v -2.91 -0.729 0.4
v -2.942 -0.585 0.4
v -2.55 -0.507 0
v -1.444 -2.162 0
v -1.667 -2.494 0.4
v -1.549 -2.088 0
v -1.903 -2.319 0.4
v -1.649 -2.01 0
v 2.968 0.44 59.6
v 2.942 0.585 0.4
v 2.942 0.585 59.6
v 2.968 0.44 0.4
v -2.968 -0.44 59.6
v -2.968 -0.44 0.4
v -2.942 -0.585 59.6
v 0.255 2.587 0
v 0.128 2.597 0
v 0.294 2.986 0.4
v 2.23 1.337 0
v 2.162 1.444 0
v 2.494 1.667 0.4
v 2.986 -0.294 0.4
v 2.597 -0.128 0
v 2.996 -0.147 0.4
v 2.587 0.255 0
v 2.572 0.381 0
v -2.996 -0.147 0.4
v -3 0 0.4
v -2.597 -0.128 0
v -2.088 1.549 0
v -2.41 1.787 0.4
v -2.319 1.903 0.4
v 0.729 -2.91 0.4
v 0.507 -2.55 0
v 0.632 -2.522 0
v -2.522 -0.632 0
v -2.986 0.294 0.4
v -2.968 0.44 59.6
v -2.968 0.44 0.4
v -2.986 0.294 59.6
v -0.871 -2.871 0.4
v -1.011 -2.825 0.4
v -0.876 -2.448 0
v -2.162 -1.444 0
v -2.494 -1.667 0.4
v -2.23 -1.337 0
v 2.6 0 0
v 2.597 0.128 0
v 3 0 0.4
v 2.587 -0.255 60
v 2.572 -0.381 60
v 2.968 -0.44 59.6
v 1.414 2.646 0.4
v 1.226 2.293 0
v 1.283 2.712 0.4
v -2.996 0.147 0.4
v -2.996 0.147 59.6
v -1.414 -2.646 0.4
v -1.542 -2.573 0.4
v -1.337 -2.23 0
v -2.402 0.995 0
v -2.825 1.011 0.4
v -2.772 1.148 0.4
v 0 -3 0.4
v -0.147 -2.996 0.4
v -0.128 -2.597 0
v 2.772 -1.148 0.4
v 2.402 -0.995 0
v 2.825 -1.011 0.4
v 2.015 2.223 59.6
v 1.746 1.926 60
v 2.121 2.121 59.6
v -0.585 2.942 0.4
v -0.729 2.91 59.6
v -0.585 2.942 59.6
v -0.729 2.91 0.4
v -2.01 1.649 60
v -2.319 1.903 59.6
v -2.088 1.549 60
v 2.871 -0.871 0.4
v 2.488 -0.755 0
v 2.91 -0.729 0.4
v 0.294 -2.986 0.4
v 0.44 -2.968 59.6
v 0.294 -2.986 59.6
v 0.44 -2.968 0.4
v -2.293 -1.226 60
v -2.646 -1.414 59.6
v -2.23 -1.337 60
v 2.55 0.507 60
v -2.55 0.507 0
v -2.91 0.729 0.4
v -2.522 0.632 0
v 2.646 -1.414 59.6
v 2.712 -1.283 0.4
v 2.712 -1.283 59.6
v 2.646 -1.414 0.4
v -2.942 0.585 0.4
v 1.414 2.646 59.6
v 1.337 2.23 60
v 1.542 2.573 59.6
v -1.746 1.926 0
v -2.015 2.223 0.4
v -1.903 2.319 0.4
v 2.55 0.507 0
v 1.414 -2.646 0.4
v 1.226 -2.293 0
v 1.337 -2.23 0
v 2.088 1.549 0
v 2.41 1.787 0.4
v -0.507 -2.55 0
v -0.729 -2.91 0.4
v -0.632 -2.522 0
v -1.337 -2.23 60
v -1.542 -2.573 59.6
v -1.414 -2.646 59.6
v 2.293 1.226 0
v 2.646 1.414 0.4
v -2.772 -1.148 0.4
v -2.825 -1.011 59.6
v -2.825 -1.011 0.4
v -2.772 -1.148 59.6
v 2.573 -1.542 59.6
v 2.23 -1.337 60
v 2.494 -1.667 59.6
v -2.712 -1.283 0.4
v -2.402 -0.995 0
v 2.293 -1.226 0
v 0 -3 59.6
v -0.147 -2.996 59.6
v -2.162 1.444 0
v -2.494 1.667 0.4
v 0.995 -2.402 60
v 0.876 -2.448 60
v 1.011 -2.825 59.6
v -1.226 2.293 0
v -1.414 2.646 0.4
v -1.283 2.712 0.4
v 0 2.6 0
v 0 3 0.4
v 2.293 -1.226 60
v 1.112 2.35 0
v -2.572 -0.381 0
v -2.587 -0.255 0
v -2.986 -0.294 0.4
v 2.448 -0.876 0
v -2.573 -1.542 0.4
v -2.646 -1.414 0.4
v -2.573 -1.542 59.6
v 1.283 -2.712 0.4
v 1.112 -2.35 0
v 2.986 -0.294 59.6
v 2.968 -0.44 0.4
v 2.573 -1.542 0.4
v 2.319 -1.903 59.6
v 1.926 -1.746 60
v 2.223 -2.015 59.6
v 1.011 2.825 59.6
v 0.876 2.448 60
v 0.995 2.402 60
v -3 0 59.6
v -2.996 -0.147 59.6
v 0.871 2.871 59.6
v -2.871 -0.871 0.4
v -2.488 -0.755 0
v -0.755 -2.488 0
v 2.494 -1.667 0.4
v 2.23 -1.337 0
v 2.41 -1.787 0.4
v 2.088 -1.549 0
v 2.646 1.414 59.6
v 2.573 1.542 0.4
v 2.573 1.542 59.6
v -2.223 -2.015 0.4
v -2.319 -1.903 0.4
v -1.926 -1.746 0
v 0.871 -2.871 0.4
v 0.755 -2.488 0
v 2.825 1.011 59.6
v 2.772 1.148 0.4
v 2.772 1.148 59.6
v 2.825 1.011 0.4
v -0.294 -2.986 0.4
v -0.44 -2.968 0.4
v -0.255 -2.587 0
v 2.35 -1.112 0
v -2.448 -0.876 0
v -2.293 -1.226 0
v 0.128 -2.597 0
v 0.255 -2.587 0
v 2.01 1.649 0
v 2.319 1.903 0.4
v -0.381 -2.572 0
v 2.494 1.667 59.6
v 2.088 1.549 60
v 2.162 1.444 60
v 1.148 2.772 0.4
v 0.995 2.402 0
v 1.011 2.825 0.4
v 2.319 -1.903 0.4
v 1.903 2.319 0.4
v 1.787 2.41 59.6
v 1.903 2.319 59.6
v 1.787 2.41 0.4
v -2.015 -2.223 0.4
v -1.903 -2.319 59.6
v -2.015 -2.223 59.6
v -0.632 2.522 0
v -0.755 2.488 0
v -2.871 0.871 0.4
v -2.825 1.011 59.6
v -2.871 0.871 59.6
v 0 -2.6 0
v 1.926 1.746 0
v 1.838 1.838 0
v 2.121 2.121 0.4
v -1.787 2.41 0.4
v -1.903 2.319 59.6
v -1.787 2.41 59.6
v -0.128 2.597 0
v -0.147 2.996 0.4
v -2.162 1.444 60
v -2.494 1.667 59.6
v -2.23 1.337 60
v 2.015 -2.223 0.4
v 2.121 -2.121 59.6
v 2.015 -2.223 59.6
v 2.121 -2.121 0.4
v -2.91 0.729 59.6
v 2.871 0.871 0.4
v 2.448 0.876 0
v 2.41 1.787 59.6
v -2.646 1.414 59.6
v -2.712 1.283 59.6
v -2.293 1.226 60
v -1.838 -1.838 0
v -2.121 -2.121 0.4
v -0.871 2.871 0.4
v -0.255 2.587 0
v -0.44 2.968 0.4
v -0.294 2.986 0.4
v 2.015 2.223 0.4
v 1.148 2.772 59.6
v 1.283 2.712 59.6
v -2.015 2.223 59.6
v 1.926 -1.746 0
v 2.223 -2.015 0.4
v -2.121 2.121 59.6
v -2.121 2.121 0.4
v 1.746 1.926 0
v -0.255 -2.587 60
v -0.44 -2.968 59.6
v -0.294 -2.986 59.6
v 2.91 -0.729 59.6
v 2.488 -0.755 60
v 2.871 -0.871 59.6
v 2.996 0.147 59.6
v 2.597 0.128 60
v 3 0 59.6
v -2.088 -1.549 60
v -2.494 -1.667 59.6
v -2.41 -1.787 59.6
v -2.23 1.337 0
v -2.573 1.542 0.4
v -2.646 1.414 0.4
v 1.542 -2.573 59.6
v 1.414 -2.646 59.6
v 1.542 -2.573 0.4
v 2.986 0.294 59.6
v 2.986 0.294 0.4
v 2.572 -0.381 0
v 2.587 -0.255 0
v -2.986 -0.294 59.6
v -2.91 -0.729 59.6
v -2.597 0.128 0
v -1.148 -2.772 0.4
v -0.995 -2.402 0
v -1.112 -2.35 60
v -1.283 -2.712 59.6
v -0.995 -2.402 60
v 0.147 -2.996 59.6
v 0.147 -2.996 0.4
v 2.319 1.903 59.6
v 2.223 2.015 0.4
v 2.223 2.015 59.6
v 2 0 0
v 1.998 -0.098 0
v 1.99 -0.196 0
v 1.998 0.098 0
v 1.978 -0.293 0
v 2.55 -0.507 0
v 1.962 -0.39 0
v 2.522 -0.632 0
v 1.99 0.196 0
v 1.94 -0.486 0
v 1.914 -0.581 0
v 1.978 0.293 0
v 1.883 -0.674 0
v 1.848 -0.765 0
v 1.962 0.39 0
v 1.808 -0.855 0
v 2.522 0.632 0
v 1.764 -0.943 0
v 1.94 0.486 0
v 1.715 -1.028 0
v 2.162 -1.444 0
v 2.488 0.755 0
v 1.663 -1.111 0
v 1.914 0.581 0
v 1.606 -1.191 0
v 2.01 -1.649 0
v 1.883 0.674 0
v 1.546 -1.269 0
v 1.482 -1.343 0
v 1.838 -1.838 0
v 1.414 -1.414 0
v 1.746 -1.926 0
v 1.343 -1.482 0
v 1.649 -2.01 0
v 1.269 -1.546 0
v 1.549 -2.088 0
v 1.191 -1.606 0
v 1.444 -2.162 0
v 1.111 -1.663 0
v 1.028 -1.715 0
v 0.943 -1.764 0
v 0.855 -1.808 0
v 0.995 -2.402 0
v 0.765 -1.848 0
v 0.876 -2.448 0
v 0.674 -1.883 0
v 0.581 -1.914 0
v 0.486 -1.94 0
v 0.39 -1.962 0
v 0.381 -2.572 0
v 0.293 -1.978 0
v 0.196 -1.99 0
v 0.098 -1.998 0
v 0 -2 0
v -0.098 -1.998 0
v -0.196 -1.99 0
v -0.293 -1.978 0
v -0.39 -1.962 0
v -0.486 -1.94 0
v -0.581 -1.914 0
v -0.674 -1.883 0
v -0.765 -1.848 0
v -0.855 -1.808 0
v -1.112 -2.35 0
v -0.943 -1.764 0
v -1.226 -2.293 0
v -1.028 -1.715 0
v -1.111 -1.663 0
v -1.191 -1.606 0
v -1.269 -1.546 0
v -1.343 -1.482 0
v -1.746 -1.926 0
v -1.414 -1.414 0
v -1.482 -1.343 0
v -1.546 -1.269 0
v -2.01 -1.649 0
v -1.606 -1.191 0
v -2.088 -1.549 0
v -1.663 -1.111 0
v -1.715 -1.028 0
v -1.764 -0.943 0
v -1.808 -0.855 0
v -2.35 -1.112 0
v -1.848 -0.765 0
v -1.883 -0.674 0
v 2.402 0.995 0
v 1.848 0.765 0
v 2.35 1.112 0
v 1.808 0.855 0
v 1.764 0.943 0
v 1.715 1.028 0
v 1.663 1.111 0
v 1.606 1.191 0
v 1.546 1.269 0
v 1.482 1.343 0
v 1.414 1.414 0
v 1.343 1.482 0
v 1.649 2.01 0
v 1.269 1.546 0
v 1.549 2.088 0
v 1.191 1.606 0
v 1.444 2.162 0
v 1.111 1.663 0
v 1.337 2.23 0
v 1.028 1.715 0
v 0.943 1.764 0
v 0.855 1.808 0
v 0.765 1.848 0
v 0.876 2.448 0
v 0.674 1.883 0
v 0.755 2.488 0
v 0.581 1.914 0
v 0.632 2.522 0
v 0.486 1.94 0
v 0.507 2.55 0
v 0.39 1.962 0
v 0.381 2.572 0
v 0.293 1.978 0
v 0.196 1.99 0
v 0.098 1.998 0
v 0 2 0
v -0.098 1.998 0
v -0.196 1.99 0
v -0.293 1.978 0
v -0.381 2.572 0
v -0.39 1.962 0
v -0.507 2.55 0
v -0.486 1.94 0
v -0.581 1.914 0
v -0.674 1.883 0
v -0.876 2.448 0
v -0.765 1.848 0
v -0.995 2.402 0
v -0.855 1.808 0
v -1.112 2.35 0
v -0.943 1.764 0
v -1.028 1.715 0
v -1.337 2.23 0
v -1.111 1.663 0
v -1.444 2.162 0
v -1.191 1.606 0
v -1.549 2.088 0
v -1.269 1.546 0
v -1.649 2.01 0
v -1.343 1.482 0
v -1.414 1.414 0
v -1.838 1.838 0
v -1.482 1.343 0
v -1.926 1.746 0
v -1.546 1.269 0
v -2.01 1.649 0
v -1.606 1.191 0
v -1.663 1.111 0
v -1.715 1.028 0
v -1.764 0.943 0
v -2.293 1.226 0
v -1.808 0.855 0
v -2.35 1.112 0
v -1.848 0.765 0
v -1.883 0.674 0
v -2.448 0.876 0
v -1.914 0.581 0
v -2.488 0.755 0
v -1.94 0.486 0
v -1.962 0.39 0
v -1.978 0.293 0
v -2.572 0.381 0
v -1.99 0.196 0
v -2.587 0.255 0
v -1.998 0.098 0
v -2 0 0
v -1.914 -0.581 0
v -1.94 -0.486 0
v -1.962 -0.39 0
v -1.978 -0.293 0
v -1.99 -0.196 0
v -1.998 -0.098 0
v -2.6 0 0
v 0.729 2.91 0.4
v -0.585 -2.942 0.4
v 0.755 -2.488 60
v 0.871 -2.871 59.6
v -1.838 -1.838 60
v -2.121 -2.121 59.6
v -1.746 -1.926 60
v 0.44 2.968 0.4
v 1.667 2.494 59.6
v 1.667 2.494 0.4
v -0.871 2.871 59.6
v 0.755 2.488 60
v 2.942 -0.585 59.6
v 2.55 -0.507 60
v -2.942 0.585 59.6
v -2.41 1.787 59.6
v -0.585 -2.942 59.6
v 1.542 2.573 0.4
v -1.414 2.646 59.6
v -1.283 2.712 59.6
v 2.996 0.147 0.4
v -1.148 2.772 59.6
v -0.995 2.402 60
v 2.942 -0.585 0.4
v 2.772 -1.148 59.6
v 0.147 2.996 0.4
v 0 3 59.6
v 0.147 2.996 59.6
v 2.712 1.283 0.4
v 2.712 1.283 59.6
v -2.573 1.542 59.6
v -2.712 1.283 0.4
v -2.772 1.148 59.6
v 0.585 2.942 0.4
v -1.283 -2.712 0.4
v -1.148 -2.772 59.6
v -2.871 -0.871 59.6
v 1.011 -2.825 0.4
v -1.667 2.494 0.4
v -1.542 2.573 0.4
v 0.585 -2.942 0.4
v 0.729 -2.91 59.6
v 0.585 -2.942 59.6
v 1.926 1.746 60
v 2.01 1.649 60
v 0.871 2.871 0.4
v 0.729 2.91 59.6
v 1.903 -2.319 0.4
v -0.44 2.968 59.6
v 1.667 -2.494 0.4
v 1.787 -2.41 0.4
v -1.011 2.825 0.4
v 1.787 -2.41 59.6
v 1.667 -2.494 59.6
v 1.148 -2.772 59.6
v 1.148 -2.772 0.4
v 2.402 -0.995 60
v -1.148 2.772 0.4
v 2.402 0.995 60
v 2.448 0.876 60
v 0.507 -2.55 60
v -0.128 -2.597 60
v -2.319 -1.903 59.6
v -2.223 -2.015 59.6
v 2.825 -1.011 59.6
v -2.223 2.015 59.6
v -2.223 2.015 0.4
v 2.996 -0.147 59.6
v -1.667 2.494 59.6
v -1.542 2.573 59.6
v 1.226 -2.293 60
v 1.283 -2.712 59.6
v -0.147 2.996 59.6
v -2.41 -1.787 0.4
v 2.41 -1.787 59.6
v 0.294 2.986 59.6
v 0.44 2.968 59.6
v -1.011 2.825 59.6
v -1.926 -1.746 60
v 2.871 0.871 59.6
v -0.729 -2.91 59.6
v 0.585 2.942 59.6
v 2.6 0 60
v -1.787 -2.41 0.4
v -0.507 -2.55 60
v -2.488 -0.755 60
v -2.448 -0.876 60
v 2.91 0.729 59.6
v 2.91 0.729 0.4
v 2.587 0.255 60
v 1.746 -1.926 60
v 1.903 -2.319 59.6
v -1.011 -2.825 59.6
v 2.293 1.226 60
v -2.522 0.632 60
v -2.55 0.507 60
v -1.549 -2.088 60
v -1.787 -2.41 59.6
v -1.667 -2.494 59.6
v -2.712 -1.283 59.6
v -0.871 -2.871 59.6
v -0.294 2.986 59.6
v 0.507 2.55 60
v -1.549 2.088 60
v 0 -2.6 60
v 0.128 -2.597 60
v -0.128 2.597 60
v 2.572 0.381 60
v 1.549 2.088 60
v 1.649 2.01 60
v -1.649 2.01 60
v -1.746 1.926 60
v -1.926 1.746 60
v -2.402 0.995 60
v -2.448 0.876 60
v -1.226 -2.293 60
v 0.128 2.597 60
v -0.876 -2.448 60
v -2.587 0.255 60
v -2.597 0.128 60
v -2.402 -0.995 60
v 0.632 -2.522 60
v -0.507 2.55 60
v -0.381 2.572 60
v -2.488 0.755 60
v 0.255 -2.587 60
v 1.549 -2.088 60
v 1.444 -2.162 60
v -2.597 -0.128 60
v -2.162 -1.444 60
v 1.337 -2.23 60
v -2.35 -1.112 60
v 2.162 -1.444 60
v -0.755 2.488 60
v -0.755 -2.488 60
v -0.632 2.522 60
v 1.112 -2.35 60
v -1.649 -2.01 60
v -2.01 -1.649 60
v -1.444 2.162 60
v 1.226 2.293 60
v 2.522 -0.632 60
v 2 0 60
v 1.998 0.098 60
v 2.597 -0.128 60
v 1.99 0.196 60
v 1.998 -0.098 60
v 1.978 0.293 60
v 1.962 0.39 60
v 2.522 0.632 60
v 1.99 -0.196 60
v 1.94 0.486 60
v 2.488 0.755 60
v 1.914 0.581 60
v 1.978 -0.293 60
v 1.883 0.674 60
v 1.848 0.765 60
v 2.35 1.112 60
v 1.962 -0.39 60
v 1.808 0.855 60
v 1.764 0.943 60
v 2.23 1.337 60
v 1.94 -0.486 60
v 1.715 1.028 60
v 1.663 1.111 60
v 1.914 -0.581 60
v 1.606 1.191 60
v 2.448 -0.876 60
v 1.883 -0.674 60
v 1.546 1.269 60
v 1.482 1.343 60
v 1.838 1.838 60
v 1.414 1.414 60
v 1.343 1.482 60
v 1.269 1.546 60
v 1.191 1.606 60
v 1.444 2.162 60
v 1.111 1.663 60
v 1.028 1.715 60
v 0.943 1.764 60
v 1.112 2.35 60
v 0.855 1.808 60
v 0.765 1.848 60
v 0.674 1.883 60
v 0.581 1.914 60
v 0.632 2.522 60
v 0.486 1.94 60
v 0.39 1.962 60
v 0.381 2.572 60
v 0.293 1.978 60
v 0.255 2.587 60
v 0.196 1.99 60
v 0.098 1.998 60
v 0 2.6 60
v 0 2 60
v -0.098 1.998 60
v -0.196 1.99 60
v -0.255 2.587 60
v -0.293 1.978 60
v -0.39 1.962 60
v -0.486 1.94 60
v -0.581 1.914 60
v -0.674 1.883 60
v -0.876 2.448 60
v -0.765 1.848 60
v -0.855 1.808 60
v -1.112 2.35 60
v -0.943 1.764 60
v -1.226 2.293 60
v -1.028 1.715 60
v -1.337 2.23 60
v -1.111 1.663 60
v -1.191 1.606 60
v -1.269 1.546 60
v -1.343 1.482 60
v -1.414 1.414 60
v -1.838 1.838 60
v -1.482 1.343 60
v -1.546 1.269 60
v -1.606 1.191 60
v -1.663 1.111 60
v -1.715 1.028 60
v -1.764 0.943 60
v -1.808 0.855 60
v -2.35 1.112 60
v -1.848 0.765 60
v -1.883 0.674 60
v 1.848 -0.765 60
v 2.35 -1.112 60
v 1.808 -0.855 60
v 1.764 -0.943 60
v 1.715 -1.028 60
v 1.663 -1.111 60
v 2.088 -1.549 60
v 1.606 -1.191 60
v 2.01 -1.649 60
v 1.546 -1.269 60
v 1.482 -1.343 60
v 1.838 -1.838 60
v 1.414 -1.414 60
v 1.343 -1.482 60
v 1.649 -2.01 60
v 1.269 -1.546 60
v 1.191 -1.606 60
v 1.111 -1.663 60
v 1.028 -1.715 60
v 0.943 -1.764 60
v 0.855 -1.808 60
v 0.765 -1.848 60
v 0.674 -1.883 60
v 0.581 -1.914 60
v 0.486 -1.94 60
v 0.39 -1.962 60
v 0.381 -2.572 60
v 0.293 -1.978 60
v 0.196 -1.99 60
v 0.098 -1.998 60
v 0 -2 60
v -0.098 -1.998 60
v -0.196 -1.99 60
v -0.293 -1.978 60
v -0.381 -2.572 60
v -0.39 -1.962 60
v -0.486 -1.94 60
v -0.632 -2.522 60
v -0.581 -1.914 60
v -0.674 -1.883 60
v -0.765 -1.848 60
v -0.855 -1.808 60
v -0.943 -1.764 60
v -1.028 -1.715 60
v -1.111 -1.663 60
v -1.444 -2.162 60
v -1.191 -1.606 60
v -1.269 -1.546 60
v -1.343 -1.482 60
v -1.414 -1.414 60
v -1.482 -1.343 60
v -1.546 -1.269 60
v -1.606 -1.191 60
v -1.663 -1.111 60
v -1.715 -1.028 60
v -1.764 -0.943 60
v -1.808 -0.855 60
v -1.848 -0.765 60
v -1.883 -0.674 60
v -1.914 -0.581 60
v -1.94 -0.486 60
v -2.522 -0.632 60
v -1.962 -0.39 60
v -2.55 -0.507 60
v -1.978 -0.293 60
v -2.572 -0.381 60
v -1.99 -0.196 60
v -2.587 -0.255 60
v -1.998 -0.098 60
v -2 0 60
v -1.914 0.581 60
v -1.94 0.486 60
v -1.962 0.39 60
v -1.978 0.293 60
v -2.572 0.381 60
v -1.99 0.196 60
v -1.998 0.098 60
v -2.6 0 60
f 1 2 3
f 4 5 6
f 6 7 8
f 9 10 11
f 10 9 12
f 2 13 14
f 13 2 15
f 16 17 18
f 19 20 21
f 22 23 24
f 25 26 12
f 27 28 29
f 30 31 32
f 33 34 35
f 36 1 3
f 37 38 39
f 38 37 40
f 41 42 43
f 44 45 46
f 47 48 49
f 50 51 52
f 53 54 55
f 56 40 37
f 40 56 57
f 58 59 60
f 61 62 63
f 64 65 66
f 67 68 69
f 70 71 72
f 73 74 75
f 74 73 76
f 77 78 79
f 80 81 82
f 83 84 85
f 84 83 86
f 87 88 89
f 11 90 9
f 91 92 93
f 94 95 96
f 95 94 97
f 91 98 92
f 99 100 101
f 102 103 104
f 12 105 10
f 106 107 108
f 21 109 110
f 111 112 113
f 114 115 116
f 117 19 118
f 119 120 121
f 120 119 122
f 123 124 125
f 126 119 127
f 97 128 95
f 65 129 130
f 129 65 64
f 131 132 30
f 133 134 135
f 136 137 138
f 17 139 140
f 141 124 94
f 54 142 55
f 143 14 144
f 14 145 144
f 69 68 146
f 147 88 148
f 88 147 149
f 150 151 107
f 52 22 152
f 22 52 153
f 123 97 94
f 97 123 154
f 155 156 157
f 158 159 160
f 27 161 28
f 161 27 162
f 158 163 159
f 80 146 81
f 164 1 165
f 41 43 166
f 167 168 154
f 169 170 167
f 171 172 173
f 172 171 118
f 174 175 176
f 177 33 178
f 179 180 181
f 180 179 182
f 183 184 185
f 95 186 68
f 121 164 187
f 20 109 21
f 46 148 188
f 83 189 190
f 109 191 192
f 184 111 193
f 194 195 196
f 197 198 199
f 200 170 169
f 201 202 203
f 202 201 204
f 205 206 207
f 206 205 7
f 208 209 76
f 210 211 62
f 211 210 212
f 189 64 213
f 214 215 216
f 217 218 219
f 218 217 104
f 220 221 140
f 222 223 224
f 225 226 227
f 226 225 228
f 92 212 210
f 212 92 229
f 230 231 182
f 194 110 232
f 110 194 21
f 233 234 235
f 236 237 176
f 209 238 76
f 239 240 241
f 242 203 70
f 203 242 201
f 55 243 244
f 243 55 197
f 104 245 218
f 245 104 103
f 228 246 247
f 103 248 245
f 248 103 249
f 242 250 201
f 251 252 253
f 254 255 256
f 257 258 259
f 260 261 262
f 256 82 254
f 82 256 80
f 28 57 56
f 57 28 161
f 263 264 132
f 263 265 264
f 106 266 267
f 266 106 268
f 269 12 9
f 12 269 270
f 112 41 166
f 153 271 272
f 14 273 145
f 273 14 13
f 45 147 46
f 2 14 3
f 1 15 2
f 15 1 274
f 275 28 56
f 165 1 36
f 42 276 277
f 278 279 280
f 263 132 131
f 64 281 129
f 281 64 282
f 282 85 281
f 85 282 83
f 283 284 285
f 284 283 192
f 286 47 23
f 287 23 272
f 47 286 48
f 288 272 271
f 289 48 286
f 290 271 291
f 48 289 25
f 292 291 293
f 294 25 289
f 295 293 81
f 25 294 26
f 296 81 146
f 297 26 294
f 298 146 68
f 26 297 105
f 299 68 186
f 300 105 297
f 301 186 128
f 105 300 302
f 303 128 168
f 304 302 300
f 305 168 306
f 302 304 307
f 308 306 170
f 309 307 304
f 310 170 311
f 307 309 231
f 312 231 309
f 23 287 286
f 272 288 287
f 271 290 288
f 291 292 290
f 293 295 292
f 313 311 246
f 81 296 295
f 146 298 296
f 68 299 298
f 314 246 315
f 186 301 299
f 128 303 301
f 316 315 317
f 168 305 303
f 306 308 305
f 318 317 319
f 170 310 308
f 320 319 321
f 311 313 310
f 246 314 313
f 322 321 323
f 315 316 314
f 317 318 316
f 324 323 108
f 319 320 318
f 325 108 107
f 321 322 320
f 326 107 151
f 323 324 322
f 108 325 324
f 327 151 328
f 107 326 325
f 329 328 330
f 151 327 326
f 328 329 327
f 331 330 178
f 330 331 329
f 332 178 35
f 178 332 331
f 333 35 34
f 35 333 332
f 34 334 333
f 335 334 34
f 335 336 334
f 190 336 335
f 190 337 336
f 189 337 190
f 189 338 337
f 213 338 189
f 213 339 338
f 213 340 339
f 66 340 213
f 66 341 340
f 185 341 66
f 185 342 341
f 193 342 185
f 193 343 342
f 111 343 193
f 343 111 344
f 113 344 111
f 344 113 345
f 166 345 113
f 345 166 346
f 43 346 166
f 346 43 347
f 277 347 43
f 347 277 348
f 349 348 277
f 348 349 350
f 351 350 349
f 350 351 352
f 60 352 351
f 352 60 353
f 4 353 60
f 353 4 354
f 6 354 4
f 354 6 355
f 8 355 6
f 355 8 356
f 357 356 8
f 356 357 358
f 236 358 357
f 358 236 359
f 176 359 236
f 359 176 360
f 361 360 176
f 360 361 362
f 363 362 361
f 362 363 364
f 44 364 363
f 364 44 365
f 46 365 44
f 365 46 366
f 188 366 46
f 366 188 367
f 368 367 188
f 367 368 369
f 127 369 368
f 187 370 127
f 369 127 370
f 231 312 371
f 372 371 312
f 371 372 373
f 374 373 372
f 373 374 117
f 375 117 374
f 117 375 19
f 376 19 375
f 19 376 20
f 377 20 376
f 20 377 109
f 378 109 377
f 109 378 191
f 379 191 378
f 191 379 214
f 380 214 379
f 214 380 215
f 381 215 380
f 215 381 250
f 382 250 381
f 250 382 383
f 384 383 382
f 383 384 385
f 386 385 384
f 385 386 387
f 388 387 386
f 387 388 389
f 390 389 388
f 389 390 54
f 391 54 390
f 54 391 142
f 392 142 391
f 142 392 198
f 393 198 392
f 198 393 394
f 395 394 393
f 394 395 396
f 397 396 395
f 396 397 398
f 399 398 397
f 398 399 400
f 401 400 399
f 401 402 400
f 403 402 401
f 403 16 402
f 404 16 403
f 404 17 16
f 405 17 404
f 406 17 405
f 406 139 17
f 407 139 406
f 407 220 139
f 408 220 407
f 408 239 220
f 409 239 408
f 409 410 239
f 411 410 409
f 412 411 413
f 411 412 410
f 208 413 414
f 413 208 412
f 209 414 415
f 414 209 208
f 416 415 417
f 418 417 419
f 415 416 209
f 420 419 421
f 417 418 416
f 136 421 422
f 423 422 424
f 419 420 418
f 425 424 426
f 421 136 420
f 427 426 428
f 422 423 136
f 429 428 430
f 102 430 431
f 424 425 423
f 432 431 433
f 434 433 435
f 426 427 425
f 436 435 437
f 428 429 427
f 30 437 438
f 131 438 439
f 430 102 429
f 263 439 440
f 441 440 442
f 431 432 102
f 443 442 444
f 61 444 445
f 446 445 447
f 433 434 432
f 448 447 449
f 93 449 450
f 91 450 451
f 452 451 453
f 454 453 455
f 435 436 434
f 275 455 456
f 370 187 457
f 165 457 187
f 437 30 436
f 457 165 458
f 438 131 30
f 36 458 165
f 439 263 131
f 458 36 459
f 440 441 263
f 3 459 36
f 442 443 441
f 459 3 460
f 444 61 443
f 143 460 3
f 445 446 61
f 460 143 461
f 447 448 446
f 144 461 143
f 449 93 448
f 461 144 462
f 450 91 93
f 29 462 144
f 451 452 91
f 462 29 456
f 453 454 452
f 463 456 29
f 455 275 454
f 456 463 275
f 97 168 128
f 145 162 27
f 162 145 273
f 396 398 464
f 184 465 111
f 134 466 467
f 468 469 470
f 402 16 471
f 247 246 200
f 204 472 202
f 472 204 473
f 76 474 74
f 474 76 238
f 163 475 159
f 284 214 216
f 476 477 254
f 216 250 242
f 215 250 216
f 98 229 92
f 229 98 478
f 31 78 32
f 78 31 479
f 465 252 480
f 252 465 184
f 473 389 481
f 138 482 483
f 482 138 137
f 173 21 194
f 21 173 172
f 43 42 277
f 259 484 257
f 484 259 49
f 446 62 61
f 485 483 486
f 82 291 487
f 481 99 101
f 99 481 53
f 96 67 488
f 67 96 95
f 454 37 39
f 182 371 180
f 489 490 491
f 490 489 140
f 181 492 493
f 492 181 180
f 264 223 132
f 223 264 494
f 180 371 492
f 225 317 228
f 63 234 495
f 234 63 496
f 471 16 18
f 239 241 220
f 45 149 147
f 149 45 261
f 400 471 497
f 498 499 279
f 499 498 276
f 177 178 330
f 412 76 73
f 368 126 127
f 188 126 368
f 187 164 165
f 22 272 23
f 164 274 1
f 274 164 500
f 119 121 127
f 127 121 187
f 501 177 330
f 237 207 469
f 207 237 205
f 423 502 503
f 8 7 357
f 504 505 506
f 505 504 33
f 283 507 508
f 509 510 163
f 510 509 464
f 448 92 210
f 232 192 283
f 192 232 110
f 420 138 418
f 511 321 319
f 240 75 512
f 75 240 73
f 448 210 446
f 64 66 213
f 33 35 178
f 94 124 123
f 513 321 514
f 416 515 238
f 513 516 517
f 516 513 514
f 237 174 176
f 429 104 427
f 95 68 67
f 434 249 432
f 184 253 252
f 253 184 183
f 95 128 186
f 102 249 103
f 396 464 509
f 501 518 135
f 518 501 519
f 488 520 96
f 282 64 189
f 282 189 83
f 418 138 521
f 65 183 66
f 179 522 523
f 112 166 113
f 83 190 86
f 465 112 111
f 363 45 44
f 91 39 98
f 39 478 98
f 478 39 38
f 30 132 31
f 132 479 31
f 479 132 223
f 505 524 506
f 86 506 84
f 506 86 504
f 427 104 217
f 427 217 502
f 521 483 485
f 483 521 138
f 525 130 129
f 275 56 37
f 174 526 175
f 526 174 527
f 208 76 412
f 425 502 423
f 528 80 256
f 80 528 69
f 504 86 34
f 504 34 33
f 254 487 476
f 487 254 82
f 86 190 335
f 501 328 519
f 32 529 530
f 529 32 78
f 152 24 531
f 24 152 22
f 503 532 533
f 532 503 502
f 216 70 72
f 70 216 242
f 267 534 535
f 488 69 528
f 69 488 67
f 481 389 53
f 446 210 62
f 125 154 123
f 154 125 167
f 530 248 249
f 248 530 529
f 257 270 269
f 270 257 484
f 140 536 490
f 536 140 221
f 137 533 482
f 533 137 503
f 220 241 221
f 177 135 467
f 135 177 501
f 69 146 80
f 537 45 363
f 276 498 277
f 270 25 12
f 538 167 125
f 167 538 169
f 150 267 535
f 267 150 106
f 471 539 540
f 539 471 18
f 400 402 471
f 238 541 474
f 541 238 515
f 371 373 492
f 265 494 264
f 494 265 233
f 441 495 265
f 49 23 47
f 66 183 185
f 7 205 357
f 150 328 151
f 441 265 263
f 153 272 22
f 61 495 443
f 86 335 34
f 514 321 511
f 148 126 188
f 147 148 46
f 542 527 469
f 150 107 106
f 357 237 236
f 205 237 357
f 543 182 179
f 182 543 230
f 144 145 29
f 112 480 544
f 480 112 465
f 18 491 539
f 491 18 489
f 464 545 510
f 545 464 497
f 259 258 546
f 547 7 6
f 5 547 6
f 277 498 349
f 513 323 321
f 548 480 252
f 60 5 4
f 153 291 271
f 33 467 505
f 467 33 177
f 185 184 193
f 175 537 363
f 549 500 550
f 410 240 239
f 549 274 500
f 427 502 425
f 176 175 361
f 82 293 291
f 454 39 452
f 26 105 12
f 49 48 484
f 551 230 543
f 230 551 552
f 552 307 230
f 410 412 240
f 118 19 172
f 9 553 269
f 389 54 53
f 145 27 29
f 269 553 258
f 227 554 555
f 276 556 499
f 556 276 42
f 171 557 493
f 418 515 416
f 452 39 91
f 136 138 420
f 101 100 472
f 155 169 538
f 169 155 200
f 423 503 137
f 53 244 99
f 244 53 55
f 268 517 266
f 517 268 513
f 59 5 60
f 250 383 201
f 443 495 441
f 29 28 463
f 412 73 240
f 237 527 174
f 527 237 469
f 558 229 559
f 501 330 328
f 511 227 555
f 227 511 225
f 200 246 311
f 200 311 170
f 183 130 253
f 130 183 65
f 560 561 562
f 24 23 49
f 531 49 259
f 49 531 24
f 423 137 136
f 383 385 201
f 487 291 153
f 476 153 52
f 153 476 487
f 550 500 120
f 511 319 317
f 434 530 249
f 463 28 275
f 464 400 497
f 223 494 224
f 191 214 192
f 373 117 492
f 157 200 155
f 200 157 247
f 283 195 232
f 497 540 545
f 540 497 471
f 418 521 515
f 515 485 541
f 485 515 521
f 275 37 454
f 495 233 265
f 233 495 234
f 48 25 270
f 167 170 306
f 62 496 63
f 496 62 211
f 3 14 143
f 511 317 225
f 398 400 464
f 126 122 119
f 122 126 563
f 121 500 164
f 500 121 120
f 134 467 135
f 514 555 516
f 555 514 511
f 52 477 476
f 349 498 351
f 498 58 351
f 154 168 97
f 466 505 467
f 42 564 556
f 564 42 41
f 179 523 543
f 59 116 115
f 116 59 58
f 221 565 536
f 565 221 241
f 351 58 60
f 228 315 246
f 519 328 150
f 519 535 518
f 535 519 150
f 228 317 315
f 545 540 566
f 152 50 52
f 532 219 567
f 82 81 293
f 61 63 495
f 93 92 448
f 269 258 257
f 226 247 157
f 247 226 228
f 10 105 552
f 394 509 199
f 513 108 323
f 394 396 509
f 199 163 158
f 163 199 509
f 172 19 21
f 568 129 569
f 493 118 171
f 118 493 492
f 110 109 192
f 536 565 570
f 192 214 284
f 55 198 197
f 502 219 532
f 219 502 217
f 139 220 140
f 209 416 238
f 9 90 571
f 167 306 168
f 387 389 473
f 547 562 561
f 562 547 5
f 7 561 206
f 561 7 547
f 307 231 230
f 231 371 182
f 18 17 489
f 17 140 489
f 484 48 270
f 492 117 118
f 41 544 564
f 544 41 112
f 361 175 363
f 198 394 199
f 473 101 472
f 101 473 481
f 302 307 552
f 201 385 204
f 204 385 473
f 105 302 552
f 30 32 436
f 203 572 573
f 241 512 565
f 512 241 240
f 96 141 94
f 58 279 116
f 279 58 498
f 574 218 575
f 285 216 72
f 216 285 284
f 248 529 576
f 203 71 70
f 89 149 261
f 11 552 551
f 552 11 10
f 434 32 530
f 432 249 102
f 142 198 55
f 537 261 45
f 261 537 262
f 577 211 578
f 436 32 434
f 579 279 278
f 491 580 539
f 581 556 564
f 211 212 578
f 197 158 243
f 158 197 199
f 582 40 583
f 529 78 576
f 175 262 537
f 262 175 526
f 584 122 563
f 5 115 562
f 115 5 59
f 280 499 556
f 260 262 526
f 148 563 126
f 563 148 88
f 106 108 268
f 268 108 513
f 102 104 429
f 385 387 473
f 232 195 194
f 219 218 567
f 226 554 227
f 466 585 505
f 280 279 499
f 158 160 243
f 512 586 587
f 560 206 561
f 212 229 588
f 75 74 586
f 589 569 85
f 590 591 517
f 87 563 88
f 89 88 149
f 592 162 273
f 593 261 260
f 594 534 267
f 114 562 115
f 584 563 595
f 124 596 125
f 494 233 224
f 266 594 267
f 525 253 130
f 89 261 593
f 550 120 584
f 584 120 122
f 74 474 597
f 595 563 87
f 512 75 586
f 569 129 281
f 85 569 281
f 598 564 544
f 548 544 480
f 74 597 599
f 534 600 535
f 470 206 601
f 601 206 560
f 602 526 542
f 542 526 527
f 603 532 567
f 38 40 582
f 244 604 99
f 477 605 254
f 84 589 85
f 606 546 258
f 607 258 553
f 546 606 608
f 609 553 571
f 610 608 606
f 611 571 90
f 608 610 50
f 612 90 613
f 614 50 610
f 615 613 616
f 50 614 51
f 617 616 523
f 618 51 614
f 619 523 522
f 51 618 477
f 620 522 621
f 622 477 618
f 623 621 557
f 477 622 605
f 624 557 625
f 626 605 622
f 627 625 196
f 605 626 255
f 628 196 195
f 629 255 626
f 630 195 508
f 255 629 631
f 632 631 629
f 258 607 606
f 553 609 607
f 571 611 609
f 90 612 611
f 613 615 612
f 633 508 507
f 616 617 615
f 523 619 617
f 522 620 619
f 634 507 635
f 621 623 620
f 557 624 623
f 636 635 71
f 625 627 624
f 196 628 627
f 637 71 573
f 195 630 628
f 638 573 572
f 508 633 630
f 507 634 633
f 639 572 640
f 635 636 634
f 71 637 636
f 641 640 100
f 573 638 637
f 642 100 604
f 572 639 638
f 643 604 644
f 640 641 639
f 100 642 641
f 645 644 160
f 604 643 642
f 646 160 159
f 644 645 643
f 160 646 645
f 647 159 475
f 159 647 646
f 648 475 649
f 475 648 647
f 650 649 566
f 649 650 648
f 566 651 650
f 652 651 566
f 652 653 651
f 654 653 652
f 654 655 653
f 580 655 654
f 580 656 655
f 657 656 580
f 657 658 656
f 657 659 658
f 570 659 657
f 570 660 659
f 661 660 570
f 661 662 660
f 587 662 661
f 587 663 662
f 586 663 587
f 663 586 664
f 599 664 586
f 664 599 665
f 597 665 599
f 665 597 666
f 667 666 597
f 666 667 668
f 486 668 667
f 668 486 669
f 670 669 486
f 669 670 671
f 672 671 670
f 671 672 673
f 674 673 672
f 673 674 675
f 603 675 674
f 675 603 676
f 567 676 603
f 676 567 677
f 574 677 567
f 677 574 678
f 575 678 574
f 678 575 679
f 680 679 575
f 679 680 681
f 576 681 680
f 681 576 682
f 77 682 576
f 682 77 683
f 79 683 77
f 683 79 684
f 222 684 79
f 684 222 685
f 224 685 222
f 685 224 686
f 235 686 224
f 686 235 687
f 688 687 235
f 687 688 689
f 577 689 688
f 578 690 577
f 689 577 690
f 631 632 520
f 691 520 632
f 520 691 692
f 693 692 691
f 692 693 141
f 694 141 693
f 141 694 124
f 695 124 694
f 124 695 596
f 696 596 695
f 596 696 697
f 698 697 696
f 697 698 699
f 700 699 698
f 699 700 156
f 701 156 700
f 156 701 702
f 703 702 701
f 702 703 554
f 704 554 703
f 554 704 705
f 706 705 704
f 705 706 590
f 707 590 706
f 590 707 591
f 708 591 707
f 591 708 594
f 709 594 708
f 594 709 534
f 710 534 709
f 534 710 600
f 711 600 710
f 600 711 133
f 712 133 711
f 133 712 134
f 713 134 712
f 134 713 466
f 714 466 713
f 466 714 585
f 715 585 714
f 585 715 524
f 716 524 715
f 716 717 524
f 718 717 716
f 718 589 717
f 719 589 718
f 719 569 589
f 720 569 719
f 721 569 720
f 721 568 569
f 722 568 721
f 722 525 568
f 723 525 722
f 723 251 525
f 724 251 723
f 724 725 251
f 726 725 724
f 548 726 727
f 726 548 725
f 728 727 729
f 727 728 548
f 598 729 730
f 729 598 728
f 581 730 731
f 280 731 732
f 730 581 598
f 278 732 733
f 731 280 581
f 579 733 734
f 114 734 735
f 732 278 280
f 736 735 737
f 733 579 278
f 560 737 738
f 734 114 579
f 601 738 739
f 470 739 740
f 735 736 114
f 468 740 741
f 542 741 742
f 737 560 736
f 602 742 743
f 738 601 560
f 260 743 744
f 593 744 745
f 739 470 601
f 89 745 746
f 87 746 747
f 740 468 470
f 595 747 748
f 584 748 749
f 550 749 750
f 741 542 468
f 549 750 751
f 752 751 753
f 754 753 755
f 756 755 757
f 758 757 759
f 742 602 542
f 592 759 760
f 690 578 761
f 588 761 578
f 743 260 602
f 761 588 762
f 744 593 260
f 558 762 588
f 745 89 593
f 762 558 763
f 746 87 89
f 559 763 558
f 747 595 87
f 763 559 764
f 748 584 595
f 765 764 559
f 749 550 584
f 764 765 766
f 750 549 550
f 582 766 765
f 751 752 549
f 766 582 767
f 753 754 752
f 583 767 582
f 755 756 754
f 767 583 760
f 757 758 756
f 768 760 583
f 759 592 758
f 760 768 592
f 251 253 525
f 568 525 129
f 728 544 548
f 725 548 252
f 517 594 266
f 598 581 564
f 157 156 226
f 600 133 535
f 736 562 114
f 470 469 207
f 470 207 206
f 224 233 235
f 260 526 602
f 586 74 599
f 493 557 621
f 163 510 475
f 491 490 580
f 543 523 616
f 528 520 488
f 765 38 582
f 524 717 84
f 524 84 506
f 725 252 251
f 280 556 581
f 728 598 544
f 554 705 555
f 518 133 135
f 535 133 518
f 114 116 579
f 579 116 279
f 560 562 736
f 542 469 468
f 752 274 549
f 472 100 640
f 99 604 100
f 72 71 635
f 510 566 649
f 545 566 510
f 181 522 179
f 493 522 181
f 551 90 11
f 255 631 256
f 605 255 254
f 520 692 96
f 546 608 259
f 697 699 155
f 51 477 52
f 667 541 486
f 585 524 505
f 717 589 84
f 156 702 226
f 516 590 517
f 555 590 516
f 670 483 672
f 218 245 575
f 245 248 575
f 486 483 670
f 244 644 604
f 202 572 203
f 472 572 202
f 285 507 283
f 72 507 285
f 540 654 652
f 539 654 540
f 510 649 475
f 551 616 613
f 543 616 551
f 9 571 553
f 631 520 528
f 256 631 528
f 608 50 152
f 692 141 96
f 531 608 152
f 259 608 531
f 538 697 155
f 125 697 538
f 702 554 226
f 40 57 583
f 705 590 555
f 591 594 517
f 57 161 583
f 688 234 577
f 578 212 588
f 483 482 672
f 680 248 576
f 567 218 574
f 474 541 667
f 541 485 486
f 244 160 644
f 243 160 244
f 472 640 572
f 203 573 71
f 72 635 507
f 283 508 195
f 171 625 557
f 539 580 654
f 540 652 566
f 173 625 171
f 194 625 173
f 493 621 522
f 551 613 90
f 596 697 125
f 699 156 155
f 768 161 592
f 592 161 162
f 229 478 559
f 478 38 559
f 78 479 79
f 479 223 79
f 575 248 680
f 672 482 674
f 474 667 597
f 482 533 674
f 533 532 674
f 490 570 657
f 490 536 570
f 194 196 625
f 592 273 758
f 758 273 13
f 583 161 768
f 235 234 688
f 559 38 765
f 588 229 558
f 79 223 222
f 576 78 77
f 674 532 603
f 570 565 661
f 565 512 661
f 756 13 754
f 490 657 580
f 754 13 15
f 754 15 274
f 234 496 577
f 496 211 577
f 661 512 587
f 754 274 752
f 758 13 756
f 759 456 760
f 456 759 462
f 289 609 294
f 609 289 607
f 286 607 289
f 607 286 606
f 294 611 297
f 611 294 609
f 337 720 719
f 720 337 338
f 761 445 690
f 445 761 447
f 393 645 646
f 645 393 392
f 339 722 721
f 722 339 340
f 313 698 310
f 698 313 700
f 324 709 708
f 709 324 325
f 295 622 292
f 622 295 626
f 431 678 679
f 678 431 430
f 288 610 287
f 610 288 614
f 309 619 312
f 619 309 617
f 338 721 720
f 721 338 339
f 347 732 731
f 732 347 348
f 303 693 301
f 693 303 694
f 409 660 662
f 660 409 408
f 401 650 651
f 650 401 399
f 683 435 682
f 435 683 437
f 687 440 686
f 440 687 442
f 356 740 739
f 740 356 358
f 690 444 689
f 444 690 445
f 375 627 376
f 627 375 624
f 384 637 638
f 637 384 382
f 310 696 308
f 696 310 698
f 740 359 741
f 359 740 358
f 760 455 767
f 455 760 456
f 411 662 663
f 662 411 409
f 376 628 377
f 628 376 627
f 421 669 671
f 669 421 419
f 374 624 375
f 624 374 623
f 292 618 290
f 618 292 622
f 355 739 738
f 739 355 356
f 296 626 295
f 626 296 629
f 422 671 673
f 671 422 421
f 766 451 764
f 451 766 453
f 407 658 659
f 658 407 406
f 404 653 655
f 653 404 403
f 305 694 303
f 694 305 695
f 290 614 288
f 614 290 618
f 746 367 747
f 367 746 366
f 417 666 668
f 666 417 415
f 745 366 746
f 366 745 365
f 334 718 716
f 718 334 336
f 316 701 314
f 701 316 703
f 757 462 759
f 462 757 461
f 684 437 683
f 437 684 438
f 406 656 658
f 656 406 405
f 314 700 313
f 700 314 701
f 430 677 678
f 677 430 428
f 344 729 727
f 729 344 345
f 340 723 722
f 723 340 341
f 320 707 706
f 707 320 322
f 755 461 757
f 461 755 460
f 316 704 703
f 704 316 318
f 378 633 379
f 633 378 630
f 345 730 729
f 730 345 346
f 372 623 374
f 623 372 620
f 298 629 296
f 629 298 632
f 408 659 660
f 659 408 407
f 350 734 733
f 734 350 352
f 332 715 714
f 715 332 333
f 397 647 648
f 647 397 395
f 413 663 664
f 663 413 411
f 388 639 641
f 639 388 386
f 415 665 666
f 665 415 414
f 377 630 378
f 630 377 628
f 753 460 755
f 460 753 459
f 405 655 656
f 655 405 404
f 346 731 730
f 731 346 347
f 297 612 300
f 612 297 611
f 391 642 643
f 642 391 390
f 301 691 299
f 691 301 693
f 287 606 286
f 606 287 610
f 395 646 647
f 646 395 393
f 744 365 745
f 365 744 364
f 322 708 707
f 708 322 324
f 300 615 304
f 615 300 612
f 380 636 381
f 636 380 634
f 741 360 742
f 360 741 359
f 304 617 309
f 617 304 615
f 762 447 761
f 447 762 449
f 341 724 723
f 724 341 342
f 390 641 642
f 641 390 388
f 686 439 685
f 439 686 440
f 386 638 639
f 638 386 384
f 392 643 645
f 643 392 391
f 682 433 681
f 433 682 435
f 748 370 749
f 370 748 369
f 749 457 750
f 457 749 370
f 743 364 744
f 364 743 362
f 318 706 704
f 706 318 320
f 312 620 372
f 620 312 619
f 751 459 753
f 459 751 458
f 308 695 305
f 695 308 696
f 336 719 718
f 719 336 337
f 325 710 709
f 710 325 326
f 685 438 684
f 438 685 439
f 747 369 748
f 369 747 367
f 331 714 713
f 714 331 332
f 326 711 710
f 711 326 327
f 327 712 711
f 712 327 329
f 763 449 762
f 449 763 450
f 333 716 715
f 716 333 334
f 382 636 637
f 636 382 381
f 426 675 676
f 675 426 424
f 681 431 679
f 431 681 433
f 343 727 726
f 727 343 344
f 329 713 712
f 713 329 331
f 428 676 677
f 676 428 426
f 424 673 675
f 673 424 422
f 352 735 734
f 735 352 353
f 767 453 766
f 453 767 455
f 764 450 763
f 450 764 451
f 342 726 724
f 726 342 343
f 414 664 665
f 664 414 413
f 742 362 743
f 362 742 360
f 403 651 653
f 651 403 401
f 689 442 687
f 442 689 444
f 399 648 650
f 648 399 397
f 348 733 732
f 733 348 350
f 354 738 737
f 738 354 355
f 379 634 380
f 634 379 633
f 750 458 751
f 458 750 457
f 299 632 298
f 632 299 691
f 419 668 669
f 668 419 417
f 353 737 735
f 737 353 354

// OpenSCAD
$fn = 128;

// PTFE sleeving (tubing) parameters (mm)
inner_d = 4.0;     // inner diameter
outer_d = 6.0;     // outer diameter
length  = 60.0;    // tube length

// Optional: slight end chamfer for nicer render
chamfer = 0.4;     // set to 0 for square ends

module ptfe_sleeving(id, od, L, c=0) {
    assert(od > id, "outer_d must be greater than inner_d");
    assert(L > 0, "length must be > 0");
    r_in = id/2;
    r_out = od/2;

    difference() {
        // Outer body with optional chamfer
        if (c > 0) {
            hull() {
                translate([0,0,0]) cylinder(h=c, r=r_out - c);
                translate([0,0,c]) cylinder(h=L-2*c, r=r_out);
                translate([0,0,L-c]) cylinder(h=c, r=r_out - c);
            }
        } else {
            cylinder(h=L, r=r_out);
        }

        // Inner bore (extend slightly to avoid coplanar artifacts)
        translate([0,0,-0.2]) cylinder(h=L+0.4, r=r_in);
    }
}

// PTFE-like appearance (optional)
color([0.95, 0.95, 0.95, 0.95])
ptfe_sleeving(inner_d, outer_d, length, chamfer);
